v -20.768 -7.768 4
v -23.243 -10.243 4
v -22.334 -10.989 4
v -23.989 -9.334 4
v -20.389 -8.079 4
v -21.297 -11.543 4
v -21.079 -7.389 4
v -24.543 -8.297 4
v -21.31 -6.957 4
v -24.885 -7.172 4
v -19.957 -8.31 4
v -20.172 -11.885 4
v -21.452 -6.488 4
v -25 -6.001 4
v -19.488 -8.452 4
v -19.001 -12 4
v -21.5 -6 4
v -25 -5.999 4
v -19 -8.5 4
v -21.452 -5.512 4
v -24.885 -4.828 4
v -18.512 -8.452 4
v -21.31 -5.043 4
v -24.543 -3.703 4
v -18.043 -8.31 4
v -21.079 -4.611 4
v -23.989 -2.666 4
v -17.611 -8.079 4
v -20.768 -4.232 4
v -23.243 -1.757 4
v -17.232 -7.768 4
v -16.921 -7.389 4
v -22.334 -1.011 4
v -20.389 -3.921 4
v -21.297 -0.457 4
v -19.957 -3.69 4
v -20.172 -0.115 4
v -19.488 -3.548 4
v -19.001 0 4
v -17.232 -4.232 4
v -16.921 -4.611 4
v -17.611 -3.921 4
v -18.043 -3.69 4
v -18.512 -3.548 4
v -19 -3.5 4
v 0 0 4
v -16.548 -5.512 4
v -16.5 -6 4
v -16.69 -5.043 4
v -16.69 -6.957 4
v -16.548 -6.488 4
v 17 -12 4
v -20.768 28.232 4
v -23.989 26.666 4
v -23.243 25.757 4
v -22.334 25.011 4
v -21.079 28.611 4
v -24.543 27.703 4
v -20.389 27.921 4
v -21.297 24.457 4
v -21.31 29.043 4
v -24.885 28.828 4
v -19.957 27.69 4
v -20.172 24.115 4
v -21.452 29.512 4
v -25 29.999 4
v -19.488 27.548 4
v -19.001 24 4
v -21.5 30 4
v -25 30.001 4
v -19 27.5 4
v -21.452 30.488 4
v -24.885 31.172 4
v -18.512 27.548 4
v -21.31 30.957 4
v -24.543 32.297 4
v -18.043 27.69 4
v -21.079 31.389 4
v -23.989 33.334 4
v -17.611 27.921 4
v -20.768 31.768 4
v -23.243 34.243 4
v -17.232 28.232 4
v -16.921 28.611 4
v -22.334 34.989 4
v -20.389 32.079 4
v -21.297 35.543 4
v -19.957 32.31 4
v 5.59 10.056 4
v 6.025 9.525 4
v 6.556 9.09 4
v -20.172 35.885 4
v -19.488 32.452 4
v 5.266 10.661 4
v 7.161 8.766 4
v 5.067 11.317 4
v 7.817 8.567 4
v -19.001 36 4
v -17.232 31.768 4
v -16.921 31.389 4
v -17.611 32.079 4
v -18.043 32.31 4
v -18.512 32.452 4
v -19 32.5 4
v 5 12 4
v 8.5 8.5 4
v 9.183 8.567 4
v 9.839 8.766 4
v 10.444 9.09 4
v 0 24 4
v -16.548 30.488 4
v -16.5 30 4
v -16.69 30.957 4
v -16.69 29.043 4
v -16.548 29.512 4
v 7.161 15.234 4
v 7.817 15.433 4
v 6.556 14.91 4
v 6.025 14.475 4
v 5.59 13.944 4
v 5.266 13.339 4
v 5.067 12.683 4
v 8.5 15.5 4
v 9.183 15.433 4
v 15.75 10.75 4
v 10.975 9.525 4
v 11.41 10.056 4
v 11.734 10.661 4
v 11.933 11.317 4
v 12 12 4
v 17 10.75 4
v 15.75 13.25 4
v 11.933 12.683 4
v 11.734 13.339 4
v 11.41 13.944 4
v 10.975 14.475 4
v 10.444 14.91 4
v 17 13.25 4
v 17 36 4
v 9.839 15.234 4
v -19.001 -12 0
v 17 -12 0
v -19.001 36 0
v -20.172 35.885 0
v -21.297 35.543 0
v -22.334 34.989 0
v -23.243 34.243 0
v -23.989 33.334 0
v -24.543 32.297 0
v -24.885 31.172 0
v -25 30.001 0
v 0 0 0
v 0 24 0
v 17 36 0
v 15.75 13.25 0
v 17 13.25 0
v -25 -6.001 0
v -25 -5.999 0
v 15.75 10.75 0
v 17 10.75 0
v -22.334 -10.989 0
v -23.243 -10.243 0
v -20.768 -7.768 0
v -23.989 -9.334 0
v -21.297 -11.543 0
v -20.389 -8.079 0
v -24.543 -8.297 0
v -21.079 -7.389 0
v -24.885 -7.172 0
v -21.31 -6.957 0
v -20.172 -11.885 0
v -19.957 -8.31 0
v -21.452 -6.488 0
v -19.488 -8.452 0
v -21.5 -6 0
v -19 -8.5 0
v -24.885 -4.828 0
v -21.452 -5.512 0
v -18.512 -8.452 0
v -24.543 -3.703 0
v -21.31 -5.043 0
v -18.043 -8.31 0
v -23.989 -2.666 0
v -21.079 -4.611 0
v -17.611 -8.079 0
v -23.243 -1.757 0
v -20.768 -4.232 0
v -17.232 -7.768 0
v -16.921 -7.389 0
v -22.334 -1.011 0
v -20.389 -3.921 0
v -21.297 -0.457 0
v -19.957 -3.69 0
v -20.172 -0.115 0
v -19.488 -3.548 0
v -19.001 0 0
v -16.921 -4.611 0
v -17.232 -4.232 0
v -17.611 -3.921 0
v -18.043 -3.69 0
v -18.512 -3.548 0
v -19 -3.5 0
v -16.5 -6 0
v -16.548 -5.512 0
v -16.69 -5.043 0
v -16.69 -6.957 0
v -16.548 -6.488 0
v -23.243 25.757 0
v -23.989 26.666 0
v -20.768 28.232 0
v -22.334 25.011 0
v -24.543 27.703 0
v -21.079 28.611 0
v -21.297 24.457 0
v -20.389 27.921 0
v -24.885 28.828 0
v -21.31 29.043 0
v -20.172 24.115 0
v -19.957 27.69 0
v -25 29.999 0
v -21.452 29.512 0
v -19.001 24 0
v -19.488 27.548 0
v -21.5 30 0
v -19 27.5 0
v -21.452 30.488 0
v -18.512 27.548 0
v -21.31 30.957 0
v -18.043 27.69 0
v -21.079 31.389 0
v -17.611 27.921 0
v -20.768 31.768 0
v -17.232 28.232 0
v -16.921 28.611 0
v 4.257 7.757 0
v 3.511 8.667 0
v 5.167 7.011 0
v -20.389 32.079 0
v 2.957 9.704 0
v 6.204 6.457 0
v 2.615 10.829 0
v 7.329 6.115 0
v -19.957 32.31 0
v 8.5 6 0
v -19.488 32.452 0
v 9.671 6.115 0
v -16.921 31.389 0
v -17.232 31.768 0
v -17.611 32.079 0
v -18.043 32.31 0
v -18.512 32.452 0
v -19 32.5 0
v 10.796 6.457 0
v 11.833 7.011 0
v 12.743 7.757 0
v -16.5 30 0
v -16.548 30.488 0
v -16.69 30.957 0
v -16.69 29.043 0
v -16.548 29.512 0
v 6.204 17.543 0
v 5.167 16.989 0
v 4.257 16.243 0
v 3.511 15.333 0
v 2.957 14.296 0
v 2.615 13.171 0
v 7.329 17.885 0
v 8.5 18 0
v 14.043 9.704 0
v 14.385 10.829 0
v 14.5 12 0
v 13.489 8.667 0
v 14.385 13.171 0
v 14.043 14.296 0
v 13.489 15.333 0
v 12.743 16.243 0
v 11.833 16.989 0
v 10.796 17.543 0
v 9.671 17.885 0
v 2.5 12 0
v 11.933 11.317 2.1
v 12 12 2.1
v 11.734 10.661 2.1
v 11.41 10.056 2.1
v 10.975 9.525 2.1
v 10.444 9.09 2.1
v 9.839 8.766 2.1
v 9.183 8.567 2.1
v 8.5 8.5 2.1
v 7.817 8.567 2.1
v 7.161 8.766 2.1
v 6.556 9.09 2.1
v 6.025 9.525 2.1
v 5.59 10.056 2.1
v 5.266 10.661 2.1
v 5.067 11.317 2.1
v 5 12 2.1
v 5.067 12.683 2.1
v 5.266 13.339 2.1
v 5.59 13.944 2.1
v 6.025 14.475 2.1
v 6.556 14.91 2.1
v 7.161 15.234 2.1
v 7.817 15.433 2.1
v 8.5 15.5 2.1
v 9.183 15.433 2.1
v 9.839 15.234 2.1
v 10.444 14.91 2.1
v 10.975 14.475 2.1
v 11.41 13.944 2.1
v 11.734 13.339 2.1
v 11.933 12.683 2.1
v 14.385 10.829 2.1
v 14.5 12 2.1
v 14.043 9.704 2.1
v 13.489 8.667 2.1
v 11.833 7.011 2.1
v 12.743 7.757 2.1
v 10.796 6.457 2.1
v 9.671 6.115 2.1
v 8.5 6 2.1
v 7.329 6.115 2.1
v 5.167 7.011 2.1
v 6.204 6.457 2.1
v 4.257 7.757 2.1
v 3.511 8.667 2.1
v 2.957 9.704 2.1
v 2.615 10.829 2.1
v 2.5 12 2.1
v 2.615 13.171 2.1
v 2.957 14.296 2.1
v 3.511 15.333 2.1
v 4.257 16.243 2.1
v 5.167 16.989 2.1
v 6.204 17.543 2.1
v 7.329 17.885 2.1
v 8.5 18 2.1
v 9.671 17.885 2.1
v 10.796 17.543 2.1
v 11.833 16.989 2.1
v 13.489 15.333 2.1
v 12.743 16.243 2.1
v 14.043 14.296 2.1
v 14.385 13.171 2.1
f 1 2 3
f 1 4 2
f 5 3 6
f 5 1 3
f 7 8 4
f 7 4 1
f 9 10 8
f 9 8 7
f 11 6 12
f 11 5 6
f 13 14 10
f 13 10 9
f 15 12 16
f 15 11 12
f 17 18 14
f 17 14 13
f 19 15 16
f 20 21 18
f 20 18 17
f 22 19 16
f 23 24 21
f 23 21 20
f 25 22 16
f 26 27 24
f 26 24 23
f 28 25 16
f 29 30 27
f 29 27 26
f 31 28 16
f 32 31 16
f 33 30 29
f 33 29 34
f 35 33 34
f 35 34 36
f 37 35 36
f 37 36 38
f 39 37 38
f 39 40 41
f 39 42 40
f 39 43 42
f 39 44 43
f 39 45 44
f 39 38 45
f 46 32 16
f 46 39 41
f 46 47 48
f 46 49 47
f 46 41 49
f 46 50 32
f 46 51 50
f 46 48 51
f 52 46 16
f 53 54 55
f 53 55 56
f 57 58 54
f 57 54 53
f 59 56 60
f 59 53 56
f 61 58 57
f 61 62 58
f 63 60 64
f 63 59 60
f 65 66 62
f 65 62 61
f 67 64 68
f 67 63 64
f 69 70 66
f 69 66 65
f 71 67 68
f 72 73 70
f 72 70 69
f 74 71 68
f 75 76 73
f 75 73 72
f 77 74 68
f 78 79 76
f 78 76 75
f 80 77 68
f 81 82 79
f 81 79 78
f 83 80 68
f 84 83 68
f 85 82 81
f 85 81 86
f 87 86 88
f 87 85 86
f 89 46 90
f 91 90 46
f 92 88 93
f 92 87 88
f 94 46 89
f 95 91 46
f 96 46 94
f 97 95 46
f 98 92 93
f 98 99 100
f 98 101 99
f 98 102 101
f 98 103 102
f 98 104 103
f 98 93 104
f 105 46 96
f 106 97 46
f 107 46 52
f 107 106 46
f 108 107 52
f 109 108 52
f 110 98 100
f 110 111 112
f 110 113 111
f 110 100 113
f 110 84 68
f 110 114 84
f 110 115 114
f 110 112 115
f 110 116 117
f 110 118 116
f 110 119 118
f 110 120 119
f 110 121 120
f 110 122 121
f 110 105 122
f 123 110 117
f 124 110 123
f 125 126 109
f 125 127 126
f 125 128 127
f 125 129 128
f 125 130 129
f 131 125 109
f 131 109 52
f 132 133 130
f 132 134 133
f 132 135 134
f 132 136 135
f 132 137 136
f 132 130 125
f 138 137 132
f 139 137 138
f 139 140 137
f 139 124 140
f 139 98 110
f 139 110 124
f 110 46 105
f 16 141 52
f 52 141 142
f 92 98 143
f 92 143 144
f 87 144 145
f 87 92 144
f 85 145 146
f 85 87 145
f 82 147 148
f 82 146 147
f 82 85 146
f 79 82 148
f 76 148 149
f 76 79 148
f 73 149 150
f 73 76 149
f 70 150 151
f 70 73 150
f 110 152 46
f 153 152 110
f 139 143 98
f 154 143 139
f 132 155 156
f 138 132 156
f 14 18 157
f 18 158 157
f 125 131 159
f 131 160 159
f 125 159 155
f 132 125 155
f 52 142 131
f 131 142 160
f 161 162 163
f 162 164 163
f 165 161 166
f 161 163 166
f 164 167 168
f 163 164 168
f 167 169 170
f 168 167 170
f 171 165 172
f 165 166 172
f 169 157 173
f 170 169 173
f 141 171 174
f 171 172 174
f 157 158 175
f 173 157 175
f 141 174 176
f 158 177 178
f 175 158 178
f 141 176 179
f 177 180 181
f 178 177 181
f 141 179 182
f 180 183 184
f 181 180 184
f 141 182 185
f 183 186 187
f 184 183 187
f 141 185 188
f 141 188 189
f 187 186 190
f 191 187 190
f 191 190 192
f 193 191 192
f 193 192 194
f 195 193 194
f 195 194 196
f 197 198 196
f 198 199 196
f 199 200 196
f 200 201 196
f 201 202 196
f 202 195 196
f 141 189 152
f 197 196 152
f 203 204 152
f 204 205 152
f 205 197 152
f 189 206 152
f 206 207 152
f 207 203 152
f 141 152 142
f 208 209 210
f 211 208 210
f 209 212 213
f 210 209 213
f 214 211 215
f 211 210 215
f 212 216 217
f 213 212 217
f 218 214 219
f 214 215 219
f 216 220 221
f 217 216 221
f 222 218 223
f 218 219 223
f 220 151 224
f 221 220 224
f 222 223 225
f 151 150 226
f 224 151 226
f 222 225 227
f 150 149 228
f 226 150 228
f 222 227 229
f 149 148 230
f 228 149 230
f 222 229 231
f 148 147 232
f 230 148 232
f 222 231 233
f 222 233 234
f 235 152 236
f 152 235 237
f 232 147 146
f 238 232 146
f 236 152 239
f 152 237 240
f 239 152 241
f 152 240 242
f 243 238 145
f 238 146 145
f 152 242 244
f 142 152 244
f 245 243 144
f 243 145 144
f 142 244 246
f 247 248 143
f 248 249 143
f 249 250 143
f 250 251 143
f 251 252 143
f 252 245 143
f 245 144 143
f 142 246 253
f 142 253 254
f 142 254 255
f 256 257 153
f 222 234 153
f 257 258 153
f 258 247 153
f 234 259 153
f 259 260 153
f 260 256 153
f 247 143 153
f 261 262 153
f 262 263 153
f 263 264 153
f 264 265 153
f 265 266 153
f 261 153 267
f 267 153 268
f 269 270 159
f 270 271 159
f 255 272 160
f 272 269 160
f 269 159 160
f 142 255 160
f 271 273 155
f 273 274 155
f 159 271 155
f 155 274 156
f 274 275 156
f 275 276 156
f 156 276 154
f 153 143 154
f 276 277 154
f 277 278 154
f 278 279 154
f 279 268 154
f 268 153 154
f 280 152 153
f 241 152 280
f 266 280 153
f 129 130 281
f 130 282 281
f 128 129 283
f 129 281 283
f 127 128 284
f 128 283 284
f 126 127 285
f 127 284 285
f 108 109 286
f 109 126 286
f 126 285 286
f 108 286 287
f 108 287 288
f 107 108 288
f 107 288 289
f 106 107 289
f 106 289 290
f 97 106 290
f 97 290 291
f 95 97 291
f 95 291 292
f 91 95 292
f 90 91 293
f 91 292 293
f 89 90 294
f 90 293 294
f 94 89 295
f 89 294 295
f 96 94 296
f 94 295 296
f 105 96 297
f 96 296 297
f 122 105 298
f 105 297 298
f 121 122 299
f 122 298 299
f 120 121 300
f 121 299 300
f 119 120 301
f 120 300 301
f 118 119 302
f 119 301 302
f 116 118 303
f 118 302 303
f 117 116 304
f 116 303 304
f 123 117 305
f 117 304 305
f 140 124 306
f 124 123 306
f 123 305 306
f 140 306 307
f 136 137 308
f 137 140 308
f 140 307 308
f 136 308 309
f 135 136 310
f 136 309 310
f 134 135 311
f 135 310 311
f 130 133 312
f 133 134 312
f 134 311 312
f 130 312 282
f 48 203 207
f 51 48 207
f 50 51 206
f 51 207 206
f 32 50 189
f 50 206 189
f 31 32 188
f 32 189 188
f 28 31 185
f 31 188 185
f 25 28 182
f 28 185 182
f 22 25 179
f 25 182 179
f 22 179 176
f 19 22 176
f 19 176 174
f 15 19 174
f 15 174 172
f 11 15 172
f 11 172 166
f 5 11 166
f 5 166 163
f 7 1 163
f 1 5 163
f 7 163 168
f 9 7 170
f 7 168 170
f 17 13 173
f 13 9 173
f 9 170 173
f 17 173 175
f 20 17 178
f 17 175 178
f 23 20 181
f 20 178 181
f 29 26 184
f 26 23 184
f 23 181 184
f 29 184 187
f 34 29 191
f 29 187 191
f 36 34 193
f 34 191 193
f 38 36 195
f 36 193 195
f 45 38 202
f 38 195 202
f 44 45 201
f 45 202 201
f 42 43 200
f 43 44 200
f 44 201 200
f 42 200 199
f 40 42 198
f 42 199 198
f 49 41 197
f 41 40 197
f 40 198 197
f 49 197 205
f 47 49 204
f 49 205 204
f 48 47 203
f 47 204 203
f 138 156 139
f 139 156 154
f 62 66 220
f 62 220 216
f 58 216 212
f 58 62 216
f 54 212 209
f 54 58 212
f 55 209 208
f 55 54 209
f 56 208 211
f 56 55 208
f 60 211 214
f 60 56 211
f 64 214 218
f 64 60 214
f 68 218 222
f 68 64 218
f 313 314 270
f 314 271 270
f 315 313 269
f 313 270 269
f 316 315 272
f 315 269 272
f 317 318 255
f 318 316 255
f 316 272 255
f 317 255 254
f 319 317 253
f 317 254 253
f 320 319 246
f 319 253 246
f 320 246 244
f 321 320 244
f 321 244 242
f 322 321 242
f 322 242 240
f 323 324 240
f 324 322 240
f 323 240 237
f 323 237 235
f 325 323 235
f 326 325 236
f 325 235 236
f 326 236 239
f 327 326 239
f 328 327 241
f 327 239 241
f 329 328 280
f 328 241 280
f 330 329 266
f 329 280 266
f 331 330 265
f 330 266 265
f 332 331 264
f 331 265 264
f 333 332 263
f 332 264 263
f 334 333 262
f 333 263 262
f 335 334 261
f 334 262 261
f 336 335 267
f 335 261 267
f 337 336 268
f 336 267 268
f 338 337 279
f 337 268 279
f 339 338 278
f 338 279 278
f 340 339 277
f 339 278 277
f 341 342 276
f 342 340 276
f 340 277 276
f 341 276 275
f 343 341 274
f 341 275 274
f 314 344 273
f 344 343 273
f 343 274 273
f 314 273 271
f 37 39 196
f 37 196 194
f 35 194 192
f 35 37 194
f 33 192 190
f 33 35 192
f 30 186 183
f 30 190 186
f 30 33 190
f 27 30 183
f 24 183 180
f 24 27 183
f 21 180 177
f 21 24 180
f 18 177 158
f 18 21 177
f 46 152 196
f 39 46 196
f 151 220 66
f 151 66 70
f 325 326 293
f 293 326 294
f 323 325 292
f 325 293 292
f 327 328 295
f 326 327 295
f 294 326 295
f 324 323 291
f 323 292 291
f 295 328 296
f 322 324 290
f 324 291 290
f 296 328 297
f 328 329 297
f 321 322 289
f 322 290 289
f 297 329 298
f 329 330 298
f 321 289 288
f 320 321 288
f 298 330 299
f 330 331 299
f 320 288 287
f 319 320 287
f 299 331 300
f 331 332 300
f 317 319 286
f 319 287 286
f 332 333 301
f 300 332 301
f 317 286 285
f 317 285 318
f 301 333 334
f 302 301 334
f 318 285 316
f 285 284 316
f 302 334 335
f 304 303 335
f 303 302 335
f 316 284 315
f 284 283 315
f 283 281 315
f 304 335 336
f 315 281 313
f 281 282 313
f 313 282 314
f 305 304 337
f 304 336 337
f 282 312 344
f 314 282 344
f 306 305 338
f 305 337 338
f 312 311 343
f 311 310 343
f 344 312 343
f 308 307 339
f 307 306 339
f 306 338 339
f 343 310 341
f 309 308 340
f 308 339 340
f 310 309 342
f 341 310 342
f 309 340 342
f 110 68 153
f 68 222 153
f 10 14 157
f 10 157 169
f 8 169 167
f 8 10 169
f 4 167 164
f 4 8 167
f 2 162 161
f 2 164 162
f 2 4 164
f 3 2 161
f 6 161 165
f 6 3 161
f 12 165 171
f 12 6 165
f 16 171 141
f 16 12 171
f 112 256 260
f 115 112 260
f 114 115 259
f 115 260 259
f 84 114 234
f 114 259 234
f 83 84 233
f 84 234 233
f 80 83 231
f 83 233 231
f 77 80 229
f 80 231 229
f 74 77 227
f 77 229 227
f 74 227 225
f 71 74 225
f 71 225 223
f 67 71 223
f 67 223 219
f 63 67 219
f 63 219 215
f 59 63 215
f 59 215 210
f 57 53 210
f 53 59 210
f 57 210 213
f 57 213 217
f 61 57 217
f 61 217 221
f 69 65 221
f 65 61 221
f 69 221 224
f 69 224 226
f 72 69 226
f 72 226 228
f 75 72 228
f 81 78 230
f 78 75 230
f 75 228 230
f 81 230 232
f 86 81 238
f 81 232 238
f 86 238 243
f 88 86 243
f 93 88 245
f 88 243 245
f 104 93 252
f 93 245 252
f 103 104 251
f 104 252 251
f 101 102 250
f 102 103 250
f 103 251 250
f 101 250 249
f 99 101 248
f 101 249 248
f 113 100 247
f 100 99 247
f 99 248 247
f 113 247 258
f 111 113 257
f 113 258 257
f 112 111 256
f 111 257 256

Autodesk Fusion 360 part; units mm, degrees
sketch "Sketch2" plane through (0, 0, 0) normal (0, 0, 1) x (1, 0, 0)
  circle A0 centre (8.5, 12) radius 3.5
  line L0 (-25, 24) -> (-25, 36)
  line L1 (0, 0) -> (0, 24)
  line L2 (-25, 24) -> (0, 24)
  line L3 (-25, 36) -> (17, 36)
  circle A1 centre (-19, 30) radius 2.5
  circle A2 centre (8.5, 12) radius 6
  line L4 (18.25, 10.75) -> (15.75, 10.75)
  line L5 (15.75, 10.75) -> (15.75, 13.25)
  line L6 (15.75, 13.25) -> (18.25, 13.25)
  line L7 (18.25, 13.25) -> (18.25, 10.75)
  line L8 (18.25, 10.75) -> (15.75, 13.25) construction
  line L9 (15.75, 10.75) -> (18.25, 13.25) construction
  line L10 (0, 0) -> (-25, 0)
  line L11 (-25, 0) -> (-25, -12)
  line L12 (-25, -12) -> (17, -12)
  line L13 (17, -12) -> (17, 36)
  line L14 (8.5, 12) -> (17, 12) construction
  circle A3 centre (-19, -6) radius 2.5
  point P0 (17, 12)
  dimension "d16" = 7
  dimension "d20" = 12
  dimension "d21" = 25
  dimension "d22" = 12
  dimension "d23" = 5
  dimension "d25" = 12
  dimension "d30" = 2.5
  dimension "d31" = 2.5
  dimension "d34" = 6
  dimension "d35" = 6
  dimension "d36" = 12
  dimension "d37" = 25
  dimension "d38" = 17
  dimension "d39" = 8.5
  dimension "d40" = 5
  dimension "d41" = 6
  dimension "d42" = 6
extrude "Extrude3" add sketch "Sketch2" along normal blind 4 contours L0 L1 L2 L3 L4 L5 L6 L10 L11 L12 L13 | L4 L5 L6 L13 | A2
extrude "Extrude4" cut sketch "Sketch2" along normal blind 2.1 contours A2
extrude "Extrude5" cut sketch "Sketch2" along normal blind 4 contours L4 L5 L6 L13
fillet "Fillet1" radius 6 4 edges at (-25, 24, 2) (-25, 0, 2) (-25, -12, 2) (-25, 36, 2)
